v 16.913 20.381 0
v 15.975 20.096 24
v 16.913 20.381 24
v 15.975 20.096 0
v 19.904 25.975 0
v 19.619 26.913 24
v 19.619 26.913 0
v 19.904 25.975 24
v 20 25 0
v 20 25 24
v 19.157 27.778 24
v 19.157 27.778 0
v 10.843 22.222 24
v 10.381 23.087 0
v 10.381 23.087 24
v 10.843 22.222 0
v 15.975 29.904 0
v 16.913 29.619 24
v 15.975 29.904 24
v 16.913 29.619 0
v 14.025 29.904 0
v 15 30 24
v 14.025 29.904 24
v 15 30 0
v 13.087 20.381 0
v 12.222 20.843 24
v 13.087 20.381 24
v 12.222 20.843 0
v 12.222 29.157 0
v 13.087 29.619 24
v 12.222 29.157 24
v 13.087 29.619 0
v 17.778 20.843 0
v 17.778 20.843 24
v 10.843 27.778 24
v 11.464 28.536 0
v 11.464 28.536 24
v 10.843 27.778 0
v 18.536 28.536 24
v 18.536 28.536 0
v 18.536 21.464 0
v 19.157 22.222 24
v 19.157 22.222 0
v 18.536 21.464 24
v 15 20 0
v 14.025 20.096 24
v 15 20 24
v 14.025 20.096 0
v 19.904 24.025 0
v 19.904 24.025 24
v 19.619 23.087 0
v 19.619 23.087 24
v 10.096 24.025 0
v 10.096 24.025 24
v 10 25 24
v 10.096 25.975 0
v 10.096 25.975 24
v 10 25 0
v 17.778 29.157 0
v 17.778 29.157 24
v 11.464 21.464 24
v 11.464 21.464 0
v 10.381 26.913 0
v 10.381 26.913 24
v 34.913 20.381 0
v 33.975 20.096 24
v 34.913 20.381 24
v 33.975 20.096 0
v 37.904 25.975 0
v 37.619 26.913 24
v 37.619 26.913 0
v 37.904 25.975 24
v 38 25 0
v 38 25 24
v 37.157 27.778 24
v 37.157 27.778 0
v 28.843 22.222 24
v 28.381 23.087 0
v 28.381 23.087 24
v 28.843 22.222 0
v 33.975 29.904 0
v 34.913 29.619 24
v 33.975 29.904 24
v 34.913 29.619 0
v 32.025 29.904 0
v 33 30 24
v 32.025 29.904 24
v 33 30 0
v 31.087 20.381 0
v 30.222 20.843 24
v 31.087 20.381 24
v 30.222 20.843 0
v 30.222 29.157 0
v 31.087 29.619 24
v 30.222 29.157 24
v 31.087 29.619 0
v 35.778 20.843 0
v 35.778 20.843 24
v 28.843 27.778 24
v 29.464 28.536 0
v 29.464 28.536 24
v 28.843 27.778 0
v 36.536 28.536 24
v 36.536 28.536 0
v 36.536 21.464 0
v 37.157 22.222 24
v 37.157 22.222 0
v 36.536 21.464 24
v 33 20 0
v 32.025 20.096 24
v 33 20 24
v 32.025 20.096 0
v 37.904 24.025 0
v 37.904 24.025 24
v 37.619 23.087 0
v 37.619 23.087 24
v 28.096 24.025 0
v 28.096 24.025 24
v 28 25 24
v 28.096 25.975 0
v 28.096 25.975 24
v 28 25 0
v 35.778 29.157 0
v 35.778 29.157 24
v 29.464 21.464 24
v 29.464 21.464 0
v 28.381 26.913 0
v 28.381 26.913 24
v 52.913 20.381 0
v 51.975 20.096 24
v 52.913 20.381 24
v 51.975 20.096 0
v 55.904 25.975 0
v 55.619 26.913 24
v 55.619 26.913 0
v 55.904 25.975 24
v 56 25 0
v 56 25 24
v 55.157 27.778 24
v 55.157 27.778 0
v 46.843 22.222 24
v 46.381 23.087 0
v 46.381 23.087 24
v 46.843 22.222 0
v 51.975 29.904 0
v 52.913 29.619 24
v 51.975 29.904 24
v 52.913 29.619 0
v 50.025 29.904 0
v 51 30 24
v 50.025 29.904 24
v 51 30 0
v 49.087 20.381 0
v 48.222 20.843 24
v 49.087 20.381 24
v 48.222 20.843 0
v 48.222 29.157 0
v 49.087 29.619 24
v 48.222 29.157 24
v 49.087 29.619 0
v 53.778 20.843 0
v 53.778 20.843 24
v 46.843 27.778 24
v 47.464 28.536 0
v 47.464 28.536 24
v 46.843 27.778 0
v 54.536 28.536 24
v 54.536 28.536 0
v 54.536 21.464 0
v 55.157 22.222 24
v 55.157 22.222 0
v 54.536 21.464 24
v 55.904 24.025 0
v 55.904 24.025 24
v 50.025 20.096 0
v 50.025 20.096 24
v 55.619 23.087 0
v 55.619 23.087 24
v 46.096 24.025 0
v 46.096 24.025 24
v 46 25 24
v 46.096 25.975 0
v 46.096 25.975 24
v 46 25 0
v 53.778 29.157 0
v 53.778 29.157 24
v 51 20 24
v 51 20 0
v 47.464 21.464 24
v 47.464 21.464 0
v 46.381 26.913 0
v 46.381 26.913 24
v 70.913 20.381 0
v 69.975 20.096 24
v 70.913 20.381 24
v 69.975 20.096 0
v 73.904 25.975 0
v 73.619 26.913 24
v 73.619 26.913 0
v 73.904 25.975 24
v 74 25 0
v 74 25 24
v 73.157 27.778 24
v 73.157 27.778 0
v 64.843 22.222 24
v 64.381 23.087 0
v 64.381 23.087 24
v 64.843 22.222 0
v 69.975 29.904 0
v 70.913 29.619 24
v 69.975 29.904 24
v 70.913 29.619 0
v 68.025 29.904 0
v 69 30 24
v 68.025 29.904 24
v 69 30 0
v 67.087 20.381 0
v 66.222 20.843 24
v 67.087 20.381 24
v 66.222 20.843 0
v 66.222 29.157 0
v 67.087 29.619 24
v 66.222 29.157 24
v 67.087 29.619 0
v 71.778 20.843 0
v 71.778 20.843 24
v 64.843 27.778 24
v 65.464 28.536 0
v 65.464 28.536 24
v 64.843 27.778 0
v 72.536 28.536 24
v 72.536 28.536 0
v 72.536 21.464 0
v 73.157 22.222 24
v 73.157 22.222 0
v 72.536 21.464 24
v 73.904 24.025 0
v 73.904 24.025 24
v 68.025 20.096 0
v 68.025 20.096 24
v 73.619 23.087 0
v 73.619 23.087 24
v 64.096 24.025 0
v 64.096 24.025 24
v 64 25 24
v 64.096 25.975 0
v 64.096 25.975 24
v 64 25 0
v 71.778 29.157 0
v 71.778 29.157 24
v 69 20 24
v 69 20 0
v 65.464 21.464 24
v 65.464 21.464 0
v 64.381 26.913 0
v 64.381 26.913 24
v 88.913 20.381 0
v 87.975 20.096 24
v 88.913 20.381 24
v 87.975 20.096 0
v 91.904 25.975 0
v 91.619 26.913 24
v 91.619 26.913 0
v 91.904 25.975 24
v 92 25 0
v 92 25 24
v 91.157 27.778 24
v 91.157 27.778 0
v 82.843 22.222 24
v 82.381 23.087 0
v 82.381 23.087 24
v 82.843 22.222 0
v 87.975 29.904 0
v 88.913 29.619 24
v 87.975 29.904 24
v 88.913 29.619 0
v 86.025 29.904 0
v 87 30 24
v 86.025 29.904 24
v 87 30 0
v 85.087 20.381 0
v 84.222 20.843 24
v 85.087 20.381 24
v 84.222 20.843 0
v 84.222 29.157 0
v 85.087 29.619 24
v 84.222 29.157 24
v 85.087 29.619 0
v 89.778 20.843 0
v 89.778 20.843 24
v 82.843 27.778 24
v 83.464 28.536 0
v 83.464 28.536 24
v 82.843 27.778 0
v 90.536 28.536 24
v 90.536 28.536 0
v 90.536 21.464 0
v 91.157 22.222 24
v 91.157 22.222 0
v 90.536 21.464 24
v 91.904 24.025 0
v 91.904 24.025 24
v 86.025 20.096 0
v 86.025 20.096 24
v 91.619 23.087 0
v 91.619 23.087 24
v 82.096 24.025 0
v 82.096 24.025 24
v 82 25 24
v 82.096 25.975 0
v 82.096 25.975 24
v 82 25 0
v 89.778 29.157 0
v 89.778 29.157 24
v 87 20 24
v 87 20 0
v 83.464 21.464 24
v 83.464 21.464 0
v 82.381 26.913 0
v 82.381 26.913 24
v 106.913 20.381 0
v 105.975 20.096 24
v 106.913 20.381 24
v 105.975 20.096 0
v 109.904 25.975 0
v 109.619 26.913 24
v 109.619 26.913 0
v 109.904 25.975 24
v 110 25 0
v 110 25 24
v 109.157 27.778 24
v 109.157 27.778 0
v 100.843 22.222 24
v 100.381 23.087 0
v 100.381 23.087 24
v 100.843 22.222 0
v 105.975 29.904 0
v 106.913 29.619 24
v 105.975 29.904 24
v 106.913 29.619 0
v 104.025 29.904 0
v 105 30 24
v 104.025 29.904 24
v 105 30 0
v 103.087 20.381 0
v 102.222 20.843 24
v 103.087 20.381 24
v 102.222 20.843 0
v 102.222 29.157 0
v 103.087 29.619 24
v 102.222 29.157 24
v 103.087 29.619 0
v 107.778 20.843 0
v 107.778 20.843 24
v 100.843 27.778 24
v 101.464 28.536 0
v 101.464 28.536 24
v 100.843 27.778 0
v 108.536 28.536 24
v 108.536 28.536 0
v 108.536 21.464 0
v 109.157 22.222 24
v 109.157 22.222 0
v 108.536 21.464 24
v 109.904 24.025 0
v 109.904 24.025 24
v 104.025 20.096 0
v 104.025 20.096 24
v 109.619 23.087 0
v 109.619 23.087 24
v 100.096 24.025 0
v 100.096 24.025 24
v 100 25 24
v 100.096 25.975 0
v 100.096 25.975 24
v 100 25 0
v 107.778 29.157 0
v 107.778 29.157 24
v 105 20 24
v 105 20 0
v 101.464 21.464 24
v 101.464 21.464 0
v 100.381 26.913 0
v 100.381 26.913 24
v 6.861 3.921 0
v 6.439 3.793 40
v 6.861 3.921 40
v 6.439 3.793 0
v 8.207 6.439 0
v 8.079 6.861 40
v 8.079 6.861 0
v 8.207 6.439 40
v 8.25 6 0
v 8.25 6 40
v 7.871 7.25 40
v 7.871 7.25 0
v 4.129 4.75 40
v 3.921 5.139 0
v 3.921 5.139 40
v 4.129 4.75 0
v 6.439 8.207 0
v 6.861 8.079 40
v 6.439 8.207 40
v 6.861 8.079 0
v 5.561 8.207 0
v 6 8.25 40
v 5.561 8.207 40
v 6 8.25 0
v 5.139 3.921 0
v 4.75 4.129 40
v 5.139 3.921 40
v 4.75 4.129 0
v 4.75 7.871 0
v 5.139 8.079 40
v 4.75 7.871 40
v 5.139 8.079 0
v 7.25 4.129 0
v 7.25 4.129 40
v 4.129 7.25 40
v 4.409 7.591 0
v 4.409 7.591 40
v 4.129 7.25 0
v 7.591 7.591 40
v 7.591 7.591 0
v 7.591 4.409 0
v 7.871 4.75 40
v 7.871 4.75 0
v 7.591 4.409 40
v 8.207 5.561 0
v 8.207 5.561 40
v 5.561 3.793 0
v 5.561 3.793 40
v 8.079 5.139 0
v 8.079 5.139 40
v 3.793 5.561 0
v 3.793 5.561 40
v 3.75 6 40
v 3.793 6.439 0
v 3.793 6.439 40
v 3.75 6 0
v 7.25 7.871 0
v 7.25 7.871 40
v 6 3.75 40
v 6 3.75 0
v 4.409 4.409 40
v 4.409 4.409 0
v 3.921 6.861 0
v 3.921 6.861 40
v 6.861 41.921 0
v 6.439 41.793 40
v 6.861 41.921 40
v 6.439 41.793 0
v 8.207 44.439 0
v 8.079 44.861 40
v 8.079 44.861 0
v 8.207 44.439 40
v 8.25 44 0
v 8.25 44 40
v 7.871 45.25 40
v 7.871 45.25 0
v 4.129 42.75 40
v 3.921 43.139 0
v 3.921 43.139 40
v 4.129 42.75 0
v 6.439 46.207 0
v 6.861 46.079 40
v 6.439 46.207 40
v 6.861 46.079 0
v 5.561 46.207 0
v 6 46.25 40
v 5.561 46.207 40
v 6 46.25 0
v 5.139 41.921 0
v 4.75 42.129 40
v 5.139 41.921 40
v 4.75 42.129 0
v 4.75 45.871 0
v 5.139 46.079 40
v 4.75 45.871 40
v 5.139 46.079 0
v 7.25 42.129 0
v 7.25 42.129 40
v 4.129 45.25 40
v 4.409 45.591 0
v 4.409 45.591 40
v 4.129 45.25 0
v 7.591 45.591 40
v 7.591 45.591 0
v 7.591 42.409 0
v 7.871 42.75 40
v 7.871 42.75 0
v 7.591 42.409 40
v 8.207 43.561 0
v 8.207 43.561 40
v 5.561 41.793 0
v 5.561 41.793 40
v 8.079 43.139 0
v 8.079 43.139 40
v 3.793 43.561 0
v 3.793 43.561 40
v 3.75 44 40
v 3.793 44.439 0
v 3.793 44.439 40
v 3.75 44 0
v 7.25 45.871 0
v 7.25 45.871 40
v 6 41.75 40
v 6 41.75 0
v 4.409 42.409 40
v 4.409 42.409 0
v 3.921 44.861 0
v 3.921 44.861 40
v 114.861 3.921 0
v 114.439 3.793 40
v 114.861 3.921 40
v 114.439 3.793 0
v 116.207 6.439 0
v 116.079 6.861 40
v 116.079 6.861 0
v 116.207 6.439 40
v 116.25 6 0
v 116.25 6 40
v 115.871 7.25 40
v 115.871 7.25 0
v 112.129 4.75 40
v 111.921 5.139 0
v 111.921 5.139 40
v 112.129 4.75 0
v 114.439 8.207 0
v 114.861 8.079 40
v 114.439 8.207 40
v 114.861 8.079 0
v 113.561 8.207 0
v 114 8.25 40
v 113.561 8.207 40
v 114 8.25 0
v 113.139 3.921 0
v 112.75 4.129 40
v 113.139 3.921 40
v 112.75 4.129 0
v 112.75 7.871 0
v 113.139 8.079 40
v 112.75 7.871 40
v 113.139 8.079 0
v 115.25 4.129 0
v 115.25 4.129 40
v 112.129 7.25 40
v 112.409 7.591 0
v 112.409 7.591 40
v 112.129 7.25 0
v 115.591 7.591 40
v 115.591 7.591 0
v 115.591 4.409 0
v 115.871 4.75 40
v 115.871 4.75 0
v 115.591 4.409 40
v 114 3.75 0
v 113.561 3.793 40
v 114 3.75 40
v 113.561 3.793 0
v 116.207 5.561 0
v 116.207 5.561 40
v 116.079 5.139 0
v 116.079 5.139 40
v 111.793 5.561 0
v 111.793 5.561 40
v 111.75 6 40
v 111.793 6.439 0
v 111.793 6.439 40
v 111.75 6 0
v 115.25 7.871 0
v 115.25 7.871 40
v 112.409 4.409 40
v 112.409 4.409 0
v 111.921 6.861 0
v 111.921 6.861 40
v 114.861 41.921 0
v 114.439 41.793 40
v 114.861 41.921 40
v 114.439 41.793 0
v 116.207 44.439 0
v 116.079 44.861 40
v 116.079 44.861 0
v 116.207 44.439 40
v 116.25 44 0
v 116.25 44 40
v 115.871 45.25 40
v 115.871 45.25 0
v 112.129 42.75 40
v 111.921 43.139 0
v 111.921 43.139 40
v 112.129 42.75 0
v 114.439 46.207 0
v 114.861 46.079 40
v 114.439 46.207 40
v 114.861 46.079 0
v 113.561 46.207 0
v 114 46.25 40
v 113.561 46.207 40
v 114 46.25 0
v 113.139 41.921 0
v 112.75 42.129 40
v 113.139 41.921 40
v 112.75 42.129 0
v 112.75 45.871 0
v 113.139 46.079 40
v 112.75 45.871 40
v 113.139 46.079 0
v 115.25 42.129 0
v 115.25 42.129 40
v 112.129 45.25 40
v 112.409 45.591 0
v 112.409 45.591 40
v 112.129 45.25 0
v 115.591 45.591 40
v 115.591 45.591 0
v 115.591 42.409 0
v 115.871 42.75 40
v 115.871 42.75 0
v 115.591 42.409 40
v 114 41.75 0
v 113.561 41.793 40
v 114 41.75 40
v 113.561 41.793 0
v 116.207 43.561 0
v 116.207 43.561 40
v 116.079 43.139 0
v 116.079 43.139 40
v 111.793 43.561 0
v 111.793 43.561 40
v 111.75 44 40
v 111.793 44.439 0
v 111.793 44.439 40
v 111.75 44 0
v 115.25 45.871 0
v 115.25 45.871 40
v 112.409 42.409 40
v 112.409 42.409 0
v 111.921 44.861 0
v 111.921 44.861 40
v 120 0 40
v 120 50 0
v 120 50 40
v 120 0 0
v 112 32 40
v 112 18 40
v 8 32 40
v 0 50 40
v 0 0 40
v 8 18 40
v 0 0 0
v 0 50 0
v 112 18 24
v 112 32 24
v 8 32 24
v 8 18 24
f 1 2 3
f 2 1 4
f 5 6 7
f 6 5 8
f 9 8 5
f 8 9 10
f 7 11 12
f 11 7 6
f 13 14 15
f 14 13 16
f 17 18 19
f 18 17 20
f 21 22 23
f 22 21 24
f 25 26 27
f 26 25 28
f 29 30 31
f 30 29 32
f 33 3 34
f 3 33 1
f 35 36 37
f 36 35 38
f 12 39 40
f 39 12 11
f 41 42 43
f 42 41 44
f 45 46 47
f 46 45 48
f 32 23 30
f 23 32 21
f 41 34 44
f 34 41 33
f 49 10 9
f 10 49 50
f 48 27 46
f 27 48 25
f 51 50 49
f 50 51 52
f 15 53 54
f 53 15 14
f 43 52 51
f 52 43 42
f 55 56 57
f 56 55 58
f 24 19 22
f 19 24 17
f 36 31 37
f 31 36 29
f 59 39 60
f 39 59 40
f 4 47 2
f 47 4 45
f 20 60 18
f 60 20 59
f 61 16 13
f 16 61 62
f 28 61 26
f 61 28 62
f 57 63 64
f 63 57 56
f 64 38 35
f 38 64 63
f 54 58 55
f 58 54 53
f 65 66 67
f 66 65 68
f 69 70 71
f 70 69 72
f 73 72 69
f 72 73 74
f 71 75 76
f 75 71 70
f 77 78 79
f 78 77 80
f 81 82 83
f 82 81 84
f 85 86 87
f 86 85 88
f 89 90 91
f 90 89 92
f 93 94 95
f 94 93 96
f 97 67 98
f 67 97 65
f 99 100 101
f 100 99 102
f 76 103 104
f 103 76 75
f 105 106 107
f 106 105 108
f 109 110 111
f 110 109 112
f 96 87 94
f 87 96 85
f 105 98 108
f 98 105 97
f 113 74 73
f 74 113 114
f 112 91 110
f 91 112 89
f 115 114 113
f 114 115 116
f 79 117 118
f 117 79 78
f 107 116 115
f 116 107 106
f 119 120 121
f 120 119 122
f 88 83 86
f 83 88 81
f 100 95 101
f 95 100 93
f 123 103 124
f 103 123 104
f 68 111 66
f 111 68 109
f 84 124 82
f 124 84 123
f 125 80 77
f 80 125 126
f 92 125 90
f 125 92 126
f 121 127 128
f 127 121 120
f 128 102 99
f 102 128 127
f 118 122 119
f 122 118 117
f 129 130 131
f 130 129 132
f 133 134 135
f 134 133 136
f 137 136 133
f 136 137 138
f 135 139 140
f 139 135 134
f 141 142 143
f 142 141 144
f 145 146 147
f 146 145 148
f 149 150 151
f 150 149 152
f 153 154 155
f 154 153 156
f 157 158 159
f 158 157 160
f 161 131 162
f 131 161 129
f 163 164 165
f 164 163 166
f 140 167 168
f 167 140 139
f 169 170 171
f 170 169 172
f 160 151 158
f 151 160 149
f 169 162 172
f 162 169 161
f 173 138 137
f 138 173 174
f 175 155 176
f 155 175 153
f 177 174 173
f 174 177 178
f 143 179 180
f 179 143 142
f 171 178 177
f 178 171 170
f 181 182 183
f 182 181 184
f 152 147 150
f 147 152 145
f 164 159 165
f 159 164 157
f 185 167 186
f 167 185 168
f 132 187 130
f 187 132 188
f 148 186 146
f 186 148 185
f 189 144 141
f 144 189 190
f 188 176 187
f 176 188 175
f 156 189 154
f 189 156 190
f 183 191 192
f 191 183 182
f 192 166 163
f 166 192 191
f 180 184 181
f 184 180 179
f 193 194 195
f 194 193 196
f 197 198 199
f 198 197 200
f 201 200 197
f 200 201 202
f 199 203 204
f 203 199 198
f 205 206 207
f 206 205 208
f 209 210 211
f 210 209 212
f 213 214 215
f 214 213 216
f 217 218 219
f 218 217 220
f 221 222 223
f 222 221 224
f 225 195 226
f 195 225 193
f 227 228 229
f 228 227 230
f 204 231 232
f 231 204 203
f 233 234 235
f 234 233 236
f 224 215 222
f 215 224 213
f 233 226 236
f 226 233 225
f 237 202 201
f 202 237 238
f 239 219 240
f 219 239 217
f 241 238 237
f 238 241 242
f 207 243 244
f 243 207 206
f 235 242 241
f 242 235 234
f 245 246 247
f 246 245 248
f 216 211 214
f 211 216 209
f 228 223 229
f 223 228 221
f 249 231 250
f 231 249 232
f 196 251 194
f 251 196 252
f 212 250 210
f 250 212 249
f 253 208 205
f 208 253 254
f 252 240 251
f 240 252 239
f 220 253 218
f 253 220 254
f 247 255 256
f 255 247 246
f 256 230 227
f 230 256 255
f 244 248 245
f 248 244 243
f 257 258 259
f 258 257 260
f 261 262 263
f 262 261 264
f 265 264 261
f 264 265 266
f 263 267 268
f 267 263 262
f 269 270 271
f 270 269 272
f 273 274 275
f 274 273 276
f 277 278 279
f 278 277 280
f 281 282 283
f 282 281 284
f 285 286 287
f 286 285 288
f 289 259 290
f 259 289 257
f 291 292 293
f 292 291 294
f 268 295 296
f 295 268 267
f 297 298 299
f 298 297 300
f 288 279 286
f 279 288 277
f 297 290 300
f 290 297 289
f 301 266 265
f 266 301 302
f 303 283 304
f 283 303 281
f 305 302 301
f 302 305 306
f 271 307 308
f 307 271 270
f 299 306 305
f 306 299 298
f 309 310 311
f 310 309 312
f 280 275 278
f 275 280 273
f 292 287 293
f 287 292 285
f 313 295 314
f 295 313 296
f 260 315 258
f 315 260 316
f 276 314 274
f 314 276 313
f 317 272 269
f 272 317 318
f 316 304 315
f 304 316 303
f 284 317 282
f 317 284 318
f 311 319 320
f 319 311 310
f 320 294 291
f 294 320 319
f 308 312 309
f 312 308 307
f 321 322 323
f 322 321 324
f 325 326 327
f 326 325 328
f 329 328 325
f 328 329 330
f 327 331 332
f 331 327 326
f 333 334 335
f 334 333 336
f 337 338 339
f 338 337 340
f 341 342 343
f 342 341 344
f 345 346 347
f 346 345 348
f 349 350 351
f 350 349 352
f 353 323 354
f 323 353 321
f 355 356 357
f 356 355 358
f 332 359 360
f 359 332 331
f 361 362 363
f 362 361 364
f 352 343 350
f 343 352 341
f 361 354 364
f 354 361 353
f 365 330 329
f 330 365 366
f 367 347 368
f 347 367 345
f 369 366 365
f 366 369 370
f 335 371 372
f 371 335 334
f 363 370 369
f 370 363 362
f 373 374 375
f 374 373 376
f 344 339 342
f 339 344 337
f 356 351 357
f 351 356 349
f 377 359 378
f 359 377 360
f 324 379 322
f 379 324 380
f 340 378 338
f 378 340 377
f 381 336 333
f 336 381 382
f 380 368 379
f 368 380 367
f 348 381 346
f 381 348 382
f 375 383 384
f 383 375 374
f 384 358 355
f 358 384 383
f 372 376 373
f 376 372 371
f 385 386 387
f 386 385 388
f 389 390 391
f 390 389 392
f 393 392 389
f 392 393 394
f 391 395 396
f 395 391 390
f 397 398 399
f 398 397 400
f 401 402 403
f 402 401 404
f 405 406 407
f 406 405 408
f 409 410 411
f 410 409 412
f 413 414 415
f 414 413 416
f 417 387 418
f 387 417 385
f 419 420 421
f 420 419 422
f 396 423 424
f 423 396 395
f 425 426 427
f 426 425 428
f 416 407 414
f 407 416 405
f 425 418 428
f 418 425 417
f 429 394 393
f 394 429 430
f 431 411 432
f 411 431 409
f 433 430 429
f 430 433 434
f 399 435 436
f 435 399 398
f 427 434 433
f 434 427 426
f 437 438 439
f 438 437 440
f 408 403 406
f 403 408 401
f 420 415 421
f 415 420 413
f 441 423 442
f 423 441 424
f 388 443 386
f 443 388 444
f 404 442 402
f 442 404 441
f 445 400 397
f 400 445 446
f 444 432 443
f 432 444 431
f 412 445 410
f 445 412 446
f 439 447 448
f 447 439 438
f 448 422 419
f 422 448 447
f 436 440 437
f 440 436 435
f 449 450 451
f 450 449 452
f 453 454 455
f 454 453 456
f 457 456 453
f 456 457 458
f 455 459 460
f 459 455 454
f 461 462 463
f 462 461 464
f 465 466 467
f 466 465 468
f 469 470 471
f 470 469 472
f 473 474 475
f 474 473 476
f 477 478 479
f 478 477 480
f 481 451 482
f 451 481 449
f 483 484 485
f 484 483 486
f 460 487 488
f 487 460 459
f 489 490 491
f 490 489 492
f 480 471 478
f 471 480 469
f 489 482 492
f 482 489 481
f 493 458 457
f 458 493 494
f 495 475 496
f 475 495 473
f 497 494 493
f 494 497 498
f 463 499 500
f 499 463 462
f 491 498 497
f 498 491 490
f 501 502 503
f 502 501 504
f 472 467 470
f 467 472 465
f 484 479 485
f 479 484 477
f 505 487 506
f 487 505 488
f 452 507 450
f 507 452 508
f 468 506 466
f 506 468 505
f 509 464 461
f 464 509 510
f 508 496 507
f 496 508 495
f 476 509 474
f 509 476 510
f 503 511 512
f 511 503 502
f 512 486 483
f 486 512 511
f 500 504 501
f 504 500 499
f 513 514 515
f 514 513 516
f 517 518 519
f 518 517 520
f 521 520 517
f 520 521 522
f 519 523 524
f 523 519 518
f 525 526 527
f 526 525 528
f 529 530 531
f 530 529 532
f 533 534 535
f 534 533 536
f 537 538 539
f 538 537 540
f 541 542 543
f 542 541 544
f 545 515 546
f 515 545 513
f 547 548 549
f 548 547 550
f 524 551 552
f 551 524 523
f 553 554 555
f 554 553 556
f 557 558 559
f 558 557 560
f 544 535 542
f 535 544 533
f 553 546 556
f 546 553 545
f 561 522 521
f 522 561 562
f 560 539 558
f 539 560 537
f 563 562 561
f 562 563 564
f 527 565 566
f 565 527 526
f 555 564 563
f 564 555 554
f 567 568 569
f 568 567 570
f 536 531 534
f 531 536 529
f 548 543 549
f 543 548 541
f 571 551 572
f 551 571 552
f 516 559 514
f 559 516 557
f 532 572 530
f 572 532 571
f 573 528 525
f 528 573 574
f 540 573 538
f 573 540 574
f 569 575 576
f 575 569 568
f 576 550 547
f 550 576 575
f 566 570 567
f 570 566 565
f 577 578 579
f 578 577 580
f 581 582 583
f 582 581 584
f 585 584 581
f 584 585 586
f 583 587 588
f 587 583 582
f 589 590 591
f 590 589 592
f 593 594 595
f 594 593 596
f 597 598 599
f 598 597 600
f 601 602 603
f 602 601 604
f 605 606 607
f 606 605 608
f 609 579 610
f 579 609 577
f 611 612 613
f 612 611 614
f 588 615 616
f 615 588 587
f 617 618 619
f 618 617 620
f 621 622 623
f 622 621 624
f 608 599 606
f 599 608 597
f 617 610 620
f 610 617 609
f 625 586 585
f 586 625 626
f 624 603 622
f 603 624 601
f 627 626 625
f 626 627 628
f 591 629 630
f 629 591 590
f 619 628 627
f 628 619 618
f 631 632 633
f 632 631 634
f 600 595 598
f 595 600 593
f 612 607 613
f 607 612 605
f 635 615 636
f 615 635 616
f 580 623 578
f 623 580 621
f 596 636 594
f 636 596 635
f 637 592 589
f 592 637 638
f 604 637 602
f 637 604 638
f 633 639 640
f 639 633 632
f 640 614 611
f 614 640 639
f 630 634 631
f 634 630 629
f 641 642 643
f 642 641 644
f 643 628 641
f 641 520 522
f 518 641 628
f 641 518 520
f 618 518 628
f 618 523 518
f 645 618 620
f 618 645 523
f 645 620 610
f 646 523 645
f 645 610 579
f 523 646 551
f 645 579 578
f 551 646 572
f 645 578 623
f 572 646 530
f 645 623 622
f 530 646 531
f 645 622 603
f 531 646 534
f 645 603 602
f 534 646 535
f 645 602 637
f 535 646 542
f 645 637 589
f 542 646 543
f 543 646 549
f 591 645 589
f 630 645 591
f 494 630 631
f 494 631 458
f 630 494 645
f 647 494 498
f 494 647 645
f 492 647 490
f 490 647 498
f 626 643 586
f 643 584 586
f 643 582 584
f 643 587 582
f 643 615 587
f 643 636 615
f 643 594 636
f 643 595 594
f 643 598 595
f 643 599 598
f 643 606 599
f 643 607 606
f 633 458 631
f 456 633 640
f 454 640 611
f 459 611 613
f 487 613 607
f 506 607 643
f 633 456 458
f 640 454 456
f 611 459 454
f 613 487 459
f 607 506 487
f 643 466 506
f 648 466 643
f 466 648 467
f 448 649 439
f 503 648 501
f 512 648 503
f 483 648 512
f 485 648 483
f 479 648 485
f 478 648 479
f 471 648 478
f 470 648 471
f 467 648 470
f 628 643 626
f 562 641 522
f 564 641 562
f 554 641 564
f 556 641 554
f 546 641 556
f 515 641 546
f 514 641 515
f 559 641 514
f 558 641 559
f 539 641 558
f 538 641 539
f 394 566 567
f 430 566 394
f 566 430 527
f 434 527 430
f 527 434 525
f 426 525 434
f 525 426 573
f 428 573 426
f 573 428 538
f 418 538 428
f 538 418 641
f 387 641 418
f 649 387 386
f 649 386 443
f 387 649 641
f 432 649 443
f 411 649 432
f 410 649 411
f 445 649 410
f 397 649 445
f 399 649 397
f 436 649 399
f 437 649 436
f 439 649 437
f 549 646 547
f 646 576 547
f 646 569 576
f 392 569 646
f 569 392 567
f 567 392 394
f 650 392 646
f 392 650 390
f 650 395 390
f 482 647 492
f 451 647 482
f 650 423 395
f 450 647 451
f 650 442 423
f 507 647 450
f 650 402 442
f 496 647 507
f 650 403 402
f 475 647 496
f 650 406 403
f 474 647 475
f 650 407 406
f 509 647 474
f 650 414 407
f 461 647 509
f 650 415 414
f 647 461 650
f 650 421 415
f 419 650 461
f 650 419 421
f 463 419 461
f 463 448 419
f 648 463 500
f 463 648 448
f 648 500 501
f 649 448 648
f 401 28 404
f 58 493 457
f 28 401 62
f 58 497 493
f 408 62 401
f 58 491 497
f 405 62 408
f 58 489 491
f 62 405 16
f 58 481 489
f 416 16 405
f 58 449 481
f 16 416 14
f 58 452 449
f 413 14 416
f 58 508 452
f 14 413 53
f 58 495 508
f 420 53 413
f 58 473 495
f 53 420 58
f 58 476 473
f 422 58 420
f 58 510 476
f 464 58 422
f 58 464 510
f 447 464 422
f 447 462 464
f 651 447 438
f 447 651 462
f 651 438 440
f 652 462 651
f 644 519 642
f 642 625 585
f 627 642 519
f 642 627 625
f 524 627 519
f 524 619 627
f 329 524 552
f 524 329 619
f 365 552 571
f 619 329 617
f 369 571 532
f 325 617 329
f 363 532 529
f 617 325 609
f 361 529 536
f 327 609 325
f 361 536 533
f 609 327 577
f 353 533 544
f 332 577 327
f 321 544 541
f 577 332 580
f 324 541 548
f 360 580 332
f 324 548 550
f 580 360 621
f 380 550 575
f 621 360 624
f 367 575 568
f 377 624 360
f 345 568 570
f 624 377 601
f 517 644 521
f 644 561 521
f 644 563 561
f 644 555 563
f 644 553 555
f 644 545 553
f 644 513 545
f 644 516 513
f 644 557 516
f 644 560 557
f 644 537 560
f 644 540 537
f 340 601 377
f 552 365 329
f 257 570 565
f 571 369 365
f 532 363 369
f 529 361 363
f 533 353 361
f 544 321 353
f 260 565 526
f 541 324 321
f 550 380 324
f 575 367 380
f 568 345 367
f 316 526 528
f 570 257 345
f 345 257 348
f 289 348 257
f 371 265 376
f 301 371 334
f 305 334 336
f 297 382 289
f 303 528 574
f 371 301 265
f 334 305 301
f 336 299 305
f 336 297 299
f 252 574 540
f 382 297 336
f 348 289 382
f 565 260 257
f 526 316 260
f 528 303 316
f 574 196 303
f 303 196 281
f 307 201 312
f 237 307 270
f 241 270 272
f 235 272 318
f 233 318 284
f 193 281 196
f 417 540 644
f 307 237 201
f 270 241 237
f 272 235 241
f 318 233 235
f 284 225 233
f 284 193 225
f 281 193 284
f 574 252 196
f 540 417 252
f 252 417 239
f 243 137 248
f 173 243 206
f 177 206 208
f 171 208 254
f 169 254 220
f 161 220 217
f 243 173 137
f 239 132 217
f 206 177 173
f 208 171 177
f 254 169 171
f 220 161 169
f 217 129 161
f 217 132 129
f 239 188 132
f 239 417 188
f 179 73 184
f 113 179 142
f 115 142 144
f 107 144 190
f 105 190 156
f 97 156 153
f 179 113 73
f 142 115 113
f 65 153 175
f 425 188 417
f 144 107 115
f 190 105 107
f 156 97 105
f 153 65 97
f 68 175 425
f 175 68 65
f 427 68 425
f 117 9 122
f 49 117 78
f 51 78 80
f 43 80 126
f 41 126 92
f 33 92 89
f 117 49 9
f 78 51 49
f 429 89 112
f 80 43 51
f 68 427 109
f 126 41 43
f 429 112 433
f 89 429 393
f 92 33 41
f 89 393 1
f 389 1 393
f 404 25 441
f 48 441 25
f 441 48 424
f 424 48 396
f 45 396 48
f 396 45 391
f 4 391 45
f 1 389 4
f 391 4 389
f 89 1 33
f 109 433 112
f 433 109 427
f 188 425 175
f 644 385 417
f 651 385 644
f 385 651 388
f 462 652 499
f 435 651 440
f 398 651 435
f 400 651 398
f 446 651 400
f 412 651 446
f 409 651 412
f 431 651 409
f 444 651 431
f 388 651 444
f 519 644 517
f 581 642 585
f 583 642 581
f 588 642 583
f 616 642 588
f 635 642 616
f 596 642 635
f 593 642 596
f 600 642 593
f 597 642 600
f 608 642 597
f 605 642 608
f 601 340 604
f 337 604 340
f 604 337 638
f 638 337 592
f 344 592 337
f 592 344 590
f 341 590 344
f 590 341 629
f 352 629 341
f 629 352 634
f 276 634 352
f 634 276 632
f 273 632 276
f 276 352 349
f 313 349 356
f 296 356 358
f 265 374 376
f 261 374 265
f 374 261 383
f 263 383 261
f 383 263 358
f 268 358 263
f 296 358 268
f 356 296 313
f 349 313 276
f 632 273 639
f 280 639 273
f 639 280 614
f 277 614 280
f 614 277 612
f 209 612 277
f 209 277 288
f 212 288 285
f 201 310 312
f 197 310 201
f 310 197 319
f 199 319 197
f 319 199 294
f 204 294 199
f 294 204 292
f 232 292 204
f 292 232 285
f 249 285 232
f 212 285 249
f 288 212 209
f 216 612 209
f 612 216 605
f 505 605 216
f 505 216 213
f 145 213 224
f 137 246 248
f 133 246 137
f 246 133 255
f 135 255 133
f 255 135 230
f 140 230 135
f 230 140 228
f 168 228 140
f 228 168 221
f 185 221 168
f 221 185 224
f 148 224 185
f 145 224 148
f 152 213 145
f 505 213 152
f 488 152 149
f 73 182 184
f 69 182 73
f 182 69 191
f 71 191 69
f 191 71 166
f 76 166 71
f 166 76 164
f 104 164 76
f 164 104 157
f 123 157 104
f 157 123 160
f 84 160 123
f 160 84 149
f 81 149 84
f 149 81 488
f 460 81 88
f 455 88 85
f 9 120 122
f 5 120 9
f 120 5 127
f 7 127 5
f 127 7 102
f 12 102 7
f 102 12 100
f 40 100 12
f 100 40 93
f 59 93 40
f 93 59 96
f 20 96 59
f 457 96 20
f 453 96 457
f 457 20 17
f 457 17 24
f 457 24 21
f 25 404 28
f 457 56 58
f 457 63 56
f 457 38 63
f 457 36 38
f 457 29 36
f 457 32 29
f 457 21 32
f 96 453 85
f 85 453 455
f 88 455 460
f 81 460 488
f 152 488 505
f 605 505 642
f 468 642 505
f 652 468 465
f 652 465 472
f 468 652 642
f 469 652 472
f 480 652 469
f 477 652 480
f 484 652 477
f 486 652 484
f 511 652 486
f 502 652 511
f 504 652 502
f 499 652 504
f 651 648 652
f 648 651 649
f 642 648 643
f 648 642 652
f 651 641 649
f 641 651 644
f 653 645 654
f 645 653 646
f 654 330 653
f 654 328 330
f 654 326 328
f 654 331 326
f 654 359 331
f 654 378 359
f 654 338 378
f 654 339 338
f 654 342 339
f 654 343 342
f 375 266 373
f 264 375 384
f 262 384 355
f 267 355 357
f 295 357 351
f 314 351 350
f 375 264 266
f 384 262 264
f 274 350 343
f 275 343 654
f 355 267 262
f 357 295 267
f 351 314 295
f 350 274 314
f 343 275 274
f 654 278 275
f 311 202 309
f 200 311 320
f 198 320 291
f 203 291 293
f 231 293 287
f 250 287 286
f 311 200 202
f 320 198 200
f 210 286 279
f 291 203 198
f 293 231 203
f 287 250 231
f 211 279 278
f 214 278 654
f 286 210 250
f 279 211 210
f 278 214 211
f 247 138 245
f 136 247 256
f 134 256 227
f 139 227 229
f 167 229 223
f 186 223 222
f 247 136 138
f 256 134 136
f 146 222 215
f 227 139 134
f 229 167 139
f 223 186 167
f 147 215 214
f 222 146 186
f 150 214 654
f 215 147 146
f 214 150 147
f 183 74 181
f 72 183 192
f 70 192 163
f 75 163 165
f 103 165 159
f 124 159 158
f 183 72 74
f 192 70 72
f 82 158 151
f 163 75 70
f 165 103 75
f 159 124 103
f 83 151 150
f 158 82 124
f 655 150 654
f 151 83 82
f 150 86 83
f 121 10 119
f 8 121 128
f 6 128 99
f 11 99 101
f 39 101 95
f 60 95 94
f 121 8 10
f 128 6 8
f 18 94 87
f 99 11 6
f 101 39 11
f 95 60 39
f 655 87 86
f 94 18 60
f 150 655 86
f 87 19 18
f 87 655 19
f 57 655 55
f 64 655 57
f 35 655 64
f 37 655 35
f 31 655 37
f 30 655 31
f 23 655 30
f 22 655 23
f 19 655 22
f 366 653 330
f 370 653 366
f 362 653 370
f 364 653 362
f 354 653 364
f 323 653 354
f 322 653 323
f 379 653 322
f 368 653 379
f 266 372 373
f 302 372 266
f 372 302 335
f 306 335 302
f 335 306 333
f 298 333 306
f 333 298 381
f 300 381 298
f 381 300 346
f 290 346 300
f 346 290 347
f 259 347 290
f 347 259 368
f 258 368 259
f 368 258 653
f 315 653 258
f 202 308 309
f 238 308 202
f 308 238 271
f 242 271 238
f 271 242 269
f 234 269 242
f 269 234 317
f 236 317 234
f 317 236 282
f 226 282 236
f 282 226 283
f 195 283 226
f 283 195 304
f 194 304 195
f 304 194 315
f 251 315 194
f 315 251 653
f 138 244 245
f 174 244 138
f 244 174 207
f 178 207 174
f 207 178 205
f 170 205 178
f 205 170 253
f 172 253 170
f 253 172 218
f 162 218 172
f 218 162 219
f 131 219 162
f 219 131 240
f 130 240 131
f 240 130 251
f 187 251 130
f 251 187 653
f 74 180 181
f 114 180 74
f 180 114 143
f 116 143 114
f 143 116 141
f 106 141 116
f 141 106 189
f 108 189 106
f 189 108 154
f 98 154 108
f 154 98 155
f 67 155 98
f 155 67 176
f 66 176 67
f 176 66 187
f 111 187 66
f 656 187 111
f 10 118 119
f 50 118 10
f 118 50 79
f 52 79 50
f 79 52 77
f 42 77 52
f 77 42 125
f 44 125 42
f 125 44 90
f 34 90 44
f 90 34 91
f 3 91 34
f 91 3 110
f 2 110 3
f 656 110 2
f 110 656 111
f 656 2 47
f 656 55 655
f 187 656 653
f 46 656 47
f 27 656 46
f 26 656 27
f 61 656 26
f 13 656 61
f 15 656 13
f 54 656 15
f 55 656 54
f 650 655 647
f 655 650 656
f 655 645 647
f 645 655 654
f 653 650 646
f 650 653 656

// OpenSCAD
$fn = 32;

// ----------------------------------------------------------------------
// Manifold block: gallery_top manifold
// ----------------------------------------------------------------------

// --- parameters (mm) ---
block_l = 120;            // block length, X
block_w = 50;             // block width, Y
block_h = 40;             // block height, Z
port_d = 10;              // port bore diameter
port_pitch = 18;          // port pitch along X
gallery_d = 14;           // top gallery width, Y
gallery_depth = 16;       // gallery pocket depth
wall_p = 8;               // gallery end wall thickness, X
mnt_d = 4.5;              // mounting hole diameter
mnt_in = 6;               // mounting hole inset from the edges

n_ports = 6;  // ports in the row
port_x0 = (block_l - (n_ports - 1) * port_pitch) / 2;  // first port X

difference() {
  cube([block_l, block_w, block_h]);
  for (i = [0 : n_ports - 1])
    translate([port_x0 + i * port_pitch, block_w / 2, -1])
      cylinder(h = block_h + 2, d = port_d);
  translate([wall_p, block_w / 2 - gallery_d / 2, block_h - gallery_depth])
    cube([block_l - 2 * wall_p, gallery_d, gallery_depth + 1]);
  for (cx = [mnt_in, block_l - mnt_in])
    for (cy = [mnt_in, block_w - mnt_in])
      translate([cx, cy, -1]) cylinder(h = block_h + 2, d = mnt_d);
}
